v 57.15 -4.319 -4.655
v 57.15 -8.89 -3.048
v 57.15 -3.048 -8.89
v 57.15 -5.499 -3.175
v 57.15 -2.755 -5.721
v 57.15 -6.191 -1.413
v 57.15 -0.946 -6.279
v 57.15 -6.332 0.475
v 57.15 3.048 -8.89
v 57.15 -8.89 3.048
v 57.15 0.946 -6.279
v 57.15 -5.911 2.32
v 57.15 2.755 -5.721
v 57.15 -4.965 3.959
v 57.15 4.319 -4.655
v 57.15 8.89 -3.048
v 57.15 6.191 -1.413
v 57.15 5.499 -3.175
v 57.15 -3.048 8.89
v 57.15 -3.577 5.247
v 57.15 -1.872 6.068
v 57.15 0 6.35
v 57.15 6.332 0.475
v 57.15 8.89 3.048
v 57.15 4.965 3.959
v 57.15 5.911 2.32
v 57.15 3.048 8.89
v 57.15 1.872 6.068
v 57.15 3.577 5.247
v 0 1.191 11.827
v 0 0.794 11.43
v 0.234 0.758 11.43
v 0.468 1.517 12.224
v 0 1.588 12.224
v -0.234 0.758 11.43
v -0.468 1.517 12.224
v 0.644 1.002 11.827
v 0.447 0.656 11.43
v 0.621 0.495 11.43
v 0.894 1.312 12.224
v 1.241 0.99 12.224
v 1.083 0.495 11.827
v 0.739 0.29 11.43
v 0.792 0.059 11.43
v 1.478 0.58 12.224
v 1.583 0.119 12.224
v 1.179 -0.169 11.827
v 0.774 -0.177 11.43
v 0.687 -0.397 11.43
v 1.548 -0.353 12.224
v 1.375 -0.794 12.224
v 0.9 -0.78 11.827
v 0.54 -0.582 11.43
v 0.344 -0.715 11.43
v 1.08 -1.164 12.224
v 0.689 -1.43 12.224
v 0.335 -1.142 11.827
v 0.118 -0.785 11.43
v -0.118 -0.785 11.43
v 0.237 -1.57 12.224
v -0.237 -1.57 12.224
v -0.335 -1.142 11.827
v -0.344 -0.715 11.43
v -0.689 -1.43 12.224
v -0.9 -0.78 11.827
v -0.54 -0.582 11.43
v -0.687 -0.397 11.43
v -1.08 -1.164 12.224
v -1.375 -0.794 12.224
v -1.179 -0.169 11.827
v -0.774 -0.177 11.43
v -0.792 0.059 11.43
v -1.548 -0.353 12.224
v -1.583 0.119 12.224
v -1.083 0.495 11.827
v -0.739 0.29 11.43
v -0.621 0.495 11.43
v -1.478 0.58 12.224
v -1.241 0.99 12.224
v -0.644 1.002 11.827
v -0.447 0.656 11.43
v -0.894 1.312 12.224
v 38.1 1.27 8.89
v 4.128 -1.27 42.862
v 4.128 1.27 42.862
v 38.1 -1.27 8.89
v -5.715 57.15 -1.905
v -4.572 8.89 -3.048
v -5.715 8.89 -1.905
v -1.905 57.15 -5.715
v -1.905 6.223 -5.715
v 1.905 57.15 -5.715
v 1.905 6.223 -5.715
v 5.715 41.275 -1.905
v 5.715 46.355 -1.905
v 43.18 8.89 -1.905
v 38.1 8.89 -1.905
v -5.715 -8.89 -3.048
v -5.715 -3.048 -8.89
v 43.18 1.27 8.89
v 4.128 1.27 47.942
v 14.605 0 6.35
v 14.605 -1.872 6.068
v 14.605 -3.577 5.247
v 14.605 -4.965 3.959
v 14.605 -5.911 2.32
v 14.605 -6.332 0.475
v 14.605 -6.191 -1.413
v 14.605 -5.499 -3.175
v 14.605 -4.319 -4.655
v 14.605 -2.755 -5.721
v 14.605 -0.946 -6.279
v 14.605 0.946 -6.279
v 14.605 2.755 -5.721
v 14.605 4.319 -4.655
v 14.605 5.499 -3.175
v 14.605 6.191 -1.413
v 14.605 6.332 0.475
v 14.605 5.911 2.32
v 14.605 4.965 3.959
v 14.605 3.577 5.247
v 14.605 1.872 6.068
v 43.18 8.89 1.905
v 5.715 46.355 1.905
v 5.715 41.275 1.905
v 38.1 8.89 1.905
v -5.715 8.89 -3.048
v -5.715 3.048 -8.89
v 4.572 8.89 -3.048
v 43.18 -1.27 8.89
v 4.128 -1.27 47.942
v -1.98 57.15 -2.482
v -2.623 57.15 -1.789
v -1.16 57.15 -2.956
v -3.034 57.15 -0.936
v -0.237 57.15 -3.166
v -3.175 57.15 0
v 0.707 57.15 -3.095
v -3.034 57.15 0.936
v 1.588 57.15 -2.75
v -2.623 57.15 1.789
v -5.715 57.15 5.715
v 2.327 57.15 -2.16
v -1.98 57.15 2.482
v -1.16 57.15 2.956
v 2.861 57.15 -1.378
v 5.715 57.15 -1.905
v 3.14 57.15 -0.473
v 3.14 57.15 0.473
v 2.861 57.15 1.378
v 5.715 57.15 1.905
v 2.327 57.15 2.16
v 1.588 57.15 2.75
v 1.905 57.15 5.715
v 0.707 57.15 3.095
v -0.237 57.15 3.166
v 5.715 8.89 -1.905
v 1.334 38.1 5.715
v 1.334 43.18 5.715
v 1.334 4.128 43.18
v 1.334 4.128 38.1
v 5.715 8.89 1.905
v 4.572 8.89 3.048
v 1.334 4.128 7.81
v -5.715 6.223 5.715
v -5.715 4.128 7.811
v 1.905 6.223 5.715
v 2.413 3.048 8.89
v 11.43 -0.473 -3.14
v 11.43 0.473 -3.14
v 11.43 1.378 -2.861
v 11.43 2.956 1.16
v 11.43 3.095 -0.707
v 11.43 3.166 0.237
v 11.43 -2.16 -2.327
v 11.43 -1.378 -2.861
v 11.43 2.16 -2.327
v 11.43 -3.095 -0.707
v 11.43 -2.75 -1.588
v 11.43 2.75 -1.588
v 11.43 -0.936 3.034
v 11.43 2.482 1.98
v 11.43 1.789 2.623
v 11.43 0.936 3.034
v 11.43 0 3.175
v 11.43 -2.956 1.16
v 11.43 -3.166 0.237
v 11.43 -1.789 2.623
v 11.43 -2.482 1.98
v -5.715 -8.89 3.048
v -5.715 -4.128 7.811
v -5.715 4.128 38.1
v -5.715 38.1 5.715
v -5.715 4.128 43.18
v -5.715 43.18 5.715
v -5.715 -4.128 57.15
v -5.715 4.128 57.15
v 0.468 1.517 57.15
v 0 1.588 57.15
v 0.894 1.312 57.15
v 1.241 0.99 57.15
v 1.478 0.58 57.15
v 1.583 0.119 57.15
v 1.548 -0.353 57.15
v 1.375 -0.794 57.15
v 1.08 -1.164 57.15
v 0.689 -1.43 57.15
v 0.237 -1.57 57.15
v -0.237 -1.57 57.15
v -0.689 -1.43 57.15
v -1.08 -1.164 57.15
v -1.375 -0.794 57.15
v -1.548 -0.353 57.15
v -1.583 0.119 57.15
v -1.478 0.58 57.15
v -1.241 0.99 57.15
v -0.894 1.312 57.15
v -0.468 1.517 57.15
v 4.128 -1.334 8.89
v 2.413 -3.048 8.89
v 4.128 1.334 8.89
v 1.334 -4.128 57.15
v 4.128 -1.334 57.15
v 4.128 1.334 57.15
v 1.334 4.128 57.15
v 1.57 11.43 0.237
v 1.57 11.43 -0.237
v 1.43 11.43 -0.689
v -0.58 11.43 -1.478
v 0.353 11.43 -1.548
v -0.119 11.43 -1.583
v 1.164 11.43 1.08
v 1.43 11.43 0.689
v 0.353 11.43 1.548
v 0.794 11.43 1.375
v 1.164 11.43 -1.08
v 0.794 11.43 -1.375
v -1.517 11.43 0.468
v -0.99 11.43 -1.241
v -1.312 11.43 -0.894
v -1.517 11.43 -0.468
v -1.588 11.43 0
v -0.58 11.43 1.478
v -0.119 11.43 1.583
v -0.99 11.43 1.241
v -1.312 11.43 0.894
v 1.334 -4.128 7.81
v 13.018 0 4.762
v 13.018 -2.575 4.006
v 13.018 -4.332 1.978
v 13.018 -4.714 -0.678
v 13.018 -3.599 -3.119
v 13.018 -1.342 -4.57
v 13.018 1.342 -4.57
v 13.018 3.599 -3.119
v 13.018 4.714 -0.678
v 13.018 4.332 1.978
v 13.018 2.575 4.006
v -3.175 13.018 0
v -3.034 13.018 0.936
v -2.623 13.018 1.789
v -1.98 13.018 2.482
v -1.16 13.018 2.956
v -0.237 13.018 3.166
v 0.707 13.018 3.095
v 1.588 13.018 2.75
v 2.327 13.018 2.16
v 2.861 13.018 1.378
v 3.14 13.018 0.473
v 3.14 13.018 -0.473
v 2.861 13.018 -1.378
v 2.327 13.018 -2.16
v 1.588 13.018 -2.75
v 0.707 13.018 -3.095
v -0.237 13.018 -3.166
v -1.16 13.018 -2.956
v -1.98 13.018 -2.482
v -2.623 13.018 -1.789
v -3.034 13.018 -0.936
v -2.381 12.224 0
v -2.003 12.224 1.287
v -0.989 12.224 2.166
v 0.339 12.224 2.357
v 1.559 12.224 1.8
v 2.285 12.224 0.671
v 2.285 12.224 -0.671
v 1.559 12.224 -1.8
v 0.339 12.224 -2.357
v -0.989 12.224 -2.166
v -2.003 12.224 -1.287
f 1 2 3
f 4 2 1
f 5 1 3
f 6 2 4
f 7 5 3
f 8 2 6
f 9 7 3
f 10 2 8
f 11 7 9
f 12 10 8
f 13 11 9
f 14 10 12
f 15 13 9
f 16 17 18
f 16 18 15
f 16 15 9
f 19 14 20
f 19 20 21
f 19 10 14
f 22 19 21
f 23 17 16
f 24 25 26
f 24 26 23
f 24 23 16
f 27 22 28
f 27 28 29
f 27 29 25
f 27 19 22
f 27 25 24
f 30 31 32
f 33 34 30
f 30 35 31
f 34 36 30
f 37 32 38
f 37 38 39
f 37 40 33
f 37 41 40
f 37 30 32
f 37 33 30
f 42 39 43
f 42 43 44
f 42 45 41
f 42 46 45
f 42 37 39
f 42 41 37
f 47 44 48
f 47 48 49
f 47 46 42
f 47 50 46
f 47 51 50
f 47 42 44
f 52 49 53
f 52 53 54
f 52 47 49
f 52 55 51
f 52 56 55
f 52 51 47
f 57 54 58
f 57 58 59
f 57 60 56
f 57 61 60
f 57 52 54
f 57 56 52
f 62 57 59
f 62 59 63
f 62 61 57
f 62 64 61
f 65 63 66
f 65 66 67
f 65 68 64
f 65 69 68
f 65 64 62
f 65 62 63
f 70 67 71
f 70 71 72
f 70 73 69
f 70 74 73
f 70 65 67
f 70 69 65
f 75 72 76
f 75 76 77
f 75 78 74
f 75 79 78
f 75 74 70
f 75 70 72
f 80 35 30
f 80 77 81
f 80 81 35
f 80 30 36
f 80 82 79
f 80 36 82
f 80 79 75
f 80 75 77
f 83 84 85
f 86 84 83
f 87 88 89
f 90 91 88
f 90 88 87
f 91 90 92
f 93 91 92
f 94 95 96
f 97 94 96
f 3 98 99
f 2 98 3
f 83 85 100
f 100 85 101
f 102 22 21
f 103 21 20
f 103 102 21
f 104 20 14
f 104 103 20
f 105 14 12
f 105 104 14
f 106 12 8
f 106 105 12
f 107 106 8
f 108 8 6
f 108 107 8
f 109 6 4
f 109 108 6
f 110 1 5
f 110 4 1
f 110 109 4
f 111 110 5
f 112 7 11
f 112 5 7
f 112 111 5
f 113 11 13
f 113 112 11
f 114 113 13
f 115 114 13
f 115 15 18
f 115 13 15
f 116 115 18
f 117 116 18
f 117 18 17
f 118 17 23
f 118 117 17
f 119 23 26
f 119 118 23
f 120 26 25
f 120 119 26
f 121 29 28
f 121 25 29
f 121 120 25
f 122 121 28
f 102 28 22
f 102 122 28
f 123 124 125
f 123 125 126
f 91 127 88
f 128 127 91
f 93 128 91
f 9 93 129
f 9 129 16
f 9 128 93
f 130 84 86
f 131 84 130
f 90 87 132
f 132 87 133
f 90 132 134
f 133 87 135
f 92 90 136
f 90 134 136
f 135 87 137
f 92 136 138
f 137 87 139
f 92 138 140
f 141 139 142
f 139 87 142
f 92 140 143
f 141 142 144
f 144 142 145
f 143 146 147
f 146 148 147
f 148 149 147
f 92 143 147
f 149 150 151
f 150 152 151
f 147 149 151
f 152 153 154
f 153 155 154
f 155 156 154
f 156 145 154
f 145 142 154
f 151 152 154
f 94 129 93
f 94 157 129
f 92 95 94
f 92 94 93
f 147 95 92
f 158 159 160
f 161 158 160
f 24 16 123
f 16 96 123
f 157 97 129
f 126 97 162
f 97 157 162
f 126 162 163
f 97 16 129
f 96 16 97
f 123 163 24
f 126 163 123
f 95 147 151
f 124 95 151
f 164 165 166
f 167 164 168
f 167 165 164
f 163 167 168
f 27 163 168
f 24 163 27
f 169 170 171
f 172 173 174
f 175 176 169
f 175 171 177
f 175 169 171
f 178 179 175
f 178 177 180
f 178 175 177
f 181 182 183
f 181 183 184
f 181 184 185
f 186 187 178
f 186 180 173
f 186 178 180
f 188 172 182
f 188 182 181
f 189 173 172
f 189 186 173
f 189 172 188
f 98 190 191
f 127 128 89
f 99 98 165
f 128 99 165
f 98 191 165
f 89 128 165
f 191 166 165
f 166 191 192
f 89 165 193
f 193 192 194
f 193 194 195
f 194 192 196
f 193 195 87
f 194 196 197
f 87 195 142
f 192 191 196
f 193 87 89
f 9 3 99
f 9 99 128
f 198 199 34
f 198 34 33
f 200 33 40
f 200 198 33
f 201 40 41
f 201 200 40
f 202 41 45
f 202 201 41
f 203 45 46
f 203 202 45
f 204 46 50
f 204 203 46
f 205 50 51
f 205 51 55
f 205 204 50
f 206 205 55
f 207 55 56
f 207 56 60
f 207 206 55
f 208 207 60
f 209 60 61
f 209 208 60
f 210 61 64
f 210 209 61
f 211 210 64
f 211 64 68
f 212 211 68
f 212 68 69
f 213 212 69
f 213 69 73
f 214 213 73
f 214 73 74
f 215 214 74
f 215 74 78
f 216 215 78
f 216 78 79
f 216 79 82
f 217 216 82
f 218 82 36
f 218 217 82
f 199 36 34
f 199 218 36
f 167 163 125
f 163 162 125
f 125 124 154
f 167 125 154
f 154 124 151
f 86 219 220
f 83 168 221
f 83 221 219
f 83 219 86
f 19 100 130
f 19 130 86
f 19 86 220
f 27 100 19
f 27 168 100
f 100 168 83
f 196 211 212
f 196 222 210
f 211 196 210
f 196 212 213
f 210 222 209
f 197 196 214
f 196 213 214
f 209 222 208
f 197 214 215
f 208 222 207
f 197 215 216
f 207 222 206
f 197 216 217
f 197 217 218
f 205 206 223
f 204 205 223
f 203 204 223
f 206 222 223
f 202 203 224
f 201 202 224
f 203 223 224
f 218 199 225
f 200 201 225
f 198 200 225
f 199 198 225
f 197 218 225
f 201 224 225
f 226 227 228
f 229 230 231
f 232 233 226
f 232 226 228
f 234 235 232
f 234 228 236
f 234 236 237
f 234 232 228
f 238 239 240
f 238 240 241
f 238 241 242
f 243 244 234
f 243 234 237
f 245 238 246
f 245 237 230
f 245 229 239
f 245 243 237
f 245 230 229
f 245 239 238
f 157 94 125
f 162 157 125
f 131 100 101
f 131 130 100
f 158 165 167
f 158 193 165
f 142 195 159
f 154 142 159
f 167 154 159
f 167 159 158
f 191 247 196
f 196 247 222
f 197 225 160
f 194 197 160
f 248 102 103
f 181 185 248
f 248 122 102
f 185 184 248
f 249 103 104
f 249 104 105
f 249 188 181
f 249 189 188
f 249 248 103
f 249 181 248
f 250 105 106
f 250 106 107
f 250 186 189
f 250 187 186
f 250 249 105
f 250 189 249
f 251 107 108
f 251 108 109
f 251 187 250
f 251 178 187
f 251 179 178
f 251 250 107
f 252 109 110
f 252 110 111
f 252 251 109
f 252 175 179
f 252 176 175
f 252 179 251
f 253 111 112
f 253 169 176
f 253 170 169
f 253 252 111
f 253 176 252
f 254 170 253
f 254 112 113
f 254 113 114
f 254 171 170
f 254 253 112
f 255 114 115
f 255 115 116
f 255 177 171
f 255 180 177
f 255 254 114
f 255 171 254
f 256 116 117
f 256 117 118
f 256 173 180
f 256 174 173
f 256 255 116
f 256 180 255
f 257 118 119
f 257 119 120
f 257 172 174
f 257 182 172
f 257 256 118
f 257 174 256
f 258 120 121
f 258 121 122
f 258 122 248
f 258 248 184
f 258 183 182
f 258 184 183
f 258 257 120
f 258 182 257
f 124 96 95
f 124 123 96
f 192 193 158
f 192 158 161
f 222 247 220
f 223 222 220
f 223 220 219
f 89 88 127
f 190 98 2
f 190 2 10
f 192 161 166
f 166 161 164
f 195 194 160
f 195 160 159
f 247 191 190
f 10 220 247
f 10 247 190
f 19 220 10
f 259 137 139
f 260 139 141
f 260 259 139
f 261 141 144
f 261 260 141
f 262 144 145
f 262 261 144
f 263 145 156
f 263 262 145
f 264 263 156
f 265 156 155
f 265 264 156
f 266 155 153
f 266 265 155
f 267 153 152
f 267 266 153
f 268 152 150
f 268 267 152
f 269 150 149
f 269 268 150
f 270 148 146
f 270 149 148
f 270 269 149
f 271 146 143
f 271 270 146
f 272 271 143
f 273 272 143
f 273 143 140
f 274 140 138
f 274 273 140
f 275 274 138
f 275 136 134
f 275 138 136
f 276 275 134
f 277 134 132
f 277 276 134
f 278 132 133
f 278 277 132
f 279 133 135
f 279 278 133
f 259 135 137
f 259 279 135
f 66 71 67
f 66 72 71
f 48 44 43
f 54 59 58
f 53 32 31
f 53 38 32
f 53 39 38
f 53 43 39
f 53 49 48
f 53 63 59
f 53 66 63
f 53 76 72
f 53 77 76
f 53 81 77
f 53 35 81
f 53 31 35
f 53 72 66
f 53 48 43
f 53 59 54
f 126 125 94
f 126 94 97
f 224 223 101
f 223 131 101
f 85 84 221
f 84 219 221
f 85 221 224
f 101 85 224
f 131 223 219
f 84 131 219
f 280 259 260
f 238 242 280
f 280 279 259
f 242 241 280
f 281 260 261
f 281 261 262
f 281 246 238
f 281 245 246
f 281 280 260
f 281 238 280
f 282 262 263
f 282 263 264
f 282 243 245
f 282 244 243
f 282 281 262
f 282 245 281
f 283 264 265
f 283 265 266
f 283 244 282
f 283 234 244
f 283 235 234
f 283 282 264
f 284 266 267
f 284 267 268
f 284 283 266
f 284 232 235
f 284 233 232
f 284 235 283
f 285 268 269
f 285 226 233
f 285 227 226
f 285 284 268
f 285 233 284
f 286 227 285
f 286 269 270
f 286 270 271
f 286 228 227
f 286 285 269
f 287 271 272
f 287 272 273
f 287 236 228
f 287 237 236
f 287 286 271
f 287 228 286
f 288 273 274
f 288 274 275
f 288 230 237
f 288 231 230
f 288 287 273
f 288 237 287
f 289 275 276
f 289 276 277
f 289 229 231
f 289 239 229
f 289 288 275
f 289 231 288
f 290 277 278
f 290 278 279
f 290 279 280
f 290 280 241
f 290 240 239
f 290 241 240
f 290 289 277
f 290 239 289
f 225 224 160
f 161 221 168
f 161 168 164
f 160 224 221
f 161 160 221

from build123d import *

# Parameters (mm, degrees)
F1_W          = 17.78
F1_H          = 17.78
F2_DEPTH      = 57.15
F4_SIZE       = 5.842
F6_W          = 8.255
F6_H          = 8.255
F7_DEPTH      = 57.15
F8_DEPTH      = 8.89
F10_T4_DEPTH  = 63.7100645368
F10_T9_DEPTH  = 63.7100645368
F10_T14_DEPTH = 15.4500645368
F10_T19_DEPTH = 63.7100645368
F10_T24_DEPTH = 63.7100645368
F10_T29_DEPTH = 15.4500645368
F12_W         = 11.43
F12_H         = 11.43
F13_DEPTH     = 57.15
F15_SIZE      = 3.81
F17_DEPTH     = 1.27
F19_DEPTH     = 1.905
F20_DEPTH     = 5.715
F21_T1_DEPTH  = 35.7625440314
F21_T6_DEPTH  = 35.7625440314
F21_T12_DEPTH = 35.7625440314
F21_T17_DEPTH = 35.7625440314
F21_T22_DEPTH = 35.7625440314
F22_DEPTH     = 1.5875
F25_DEPTH     = 7.0485


# Not quite as in the source:
# - a fillet or chamfer that OpenCascade refuses, or shapes differently, is made with other operations: its cross-section is extruded or revolved along the edge and cut away or added
# - an extrude ends at something that could not be found from the text; its depth is read off the source's solid


with BuildPart() as f2:
    # F1 (on Right) → F2 (new body)
    with BuildSketch(Plane.YZ):
        Rectangle(F1_W, F1_H)
    extrude(amount=F2_DEPTH)

    # F0 (on Front) → F3 (revolve, cut)
    with BuildSketch(Plane.XZ):
        Polygon((11.43, 3.175), (11.43, 0), (62.23, 0), (62.23, 6.35), (14.605, 6.35), align=None)
    revolve(axis=Axis((36.83, 0, 0), (1, 0, 0)), mode=Mode.SUBTRACT)

    # F4
    f4_edges = [f2.edges().sort_by_distance(p)[0] for p in [
        (28.575, -8.89, -8.89),
        (28.575, 8.89, 8.89),
        (28.575, -8.89, 8.89),
        (28.575, 8.89, -8.89),
    ]]
    chamfer(f4_edges, length=F4_SIZE)

    # F6 (on Top) → F7 (join)
    with BuildSketch(Plane.XY):
        Rectangle(F6_W, F6_H)
    extrude(amount=F7_DEPTH)

    # F8 (add, through all): a face of the model
    f8_faces = [f2.faces().sort_by_distance(p)[0] for p in [
        (-2.06375, 0, 0),
    ]]
    extrude(f8_faces, amount=F8_DEPTH)

    # F5 (on Right) → F9 (revolve, cut)
    with BuildSketch(Plane.YZ):
        Polygon((0, 66.04), (0, 11.43), (0.79375, 11.43), (1.5875, 12.22375), (1.5875, 66.04), align=None)
    revolve(axis=Axis((0, 0, 38.735), (0, 0, -1)), mode=Mode.SUBTRACT)

    # F10: chamfer of 2.794 on 4 edges, made by hand


with BuildPart() as f10_tool2:
    # F10_s3 → F10_t4 (new body)
    with BuildSketch(Plane.XY.offset(0.6252177316)):
        Polygon((4.1275, 1.3335), (1.3335, 4.1275), (4.1275, 4.1275), align=None)
    extrude(amount=F10_T4_DEPTH)

    split(bisect_by=Plane(origin=(0, 5.969, 5.969), x_dir=(1, 0, 0), z_dir=(0, 0.7071067812, 0.7071067812)), keep=Keep.TOP)


with BuildPart() as f2_1:
    add(f2.part)

    # F10_t1: cut F10_tool2
    add(f10_tool2.part, mode=Mode.SUBTRACT)


with BuildPart() as f10_tool7:
    # F10_s8 → F10_t9 (new body)
    with BuildSketch(Plane.XY.offset(0.6252177316)):
        Polygon((4.1275, 1.3335), (1.3335, 4.1275), (4.1275, 4.1275), align=None)
    extrude(amount=F10_T9_DEPTH)

    split(bisect_by=Plane.XY.offset(8.89), keep=Keep.TOP)


with BuildPart() as f2_2:
    add(f2_1.part)

    # F10_t6: cut F10_tool7
    add(f10_tool7.part, mode=Mode.SUBTRACT)


with BuildPart() as f10_tool12:
    # F10_s13 → F10_t14 (new body)
    with BuildSketch(Plane.XY.offset(-0.6252177316)):
        Polygon((-2.794, 4.1275), (0, 1.3335), (0, 4.1275), align=None)
    extrude(amount=-F10_T14_DEPTH)

    split(bisect_by=Plane(origin=(0, 5.969, -5.969), x_dir=(1, 0, 0), z_dir=(0, 0.7071067812, -0.7071067812)), keep=Keep.TOP)


with BuildPart() as f2_3:
    add(f2_2.part)

    # F10_t11: cut F10_tool12
    add(f10_tool12.part, mode=Mode.SUBTRACT)


with BuildPart() as f10_tool17:
    # F10_s18 → F10_t19 (new body)
    with BuildSketch(Plane.XY.offset(0.6252177316)):
        Polygon((1.3335, -4.1275), (4.1275, -1.3335), (4.1275, -4.1275), align=None)
    extrude(amount=F10_T19_DEPTH)

    split(bisect_by=Plane.XY.offset(8.89), keep=Keep.TOP)


with BuildPart() as f2_4:
    add(f2_3.part)

    # F10_t16: cut F10_tool17
    add(f10_tool17.part, mode=Mode.SUBTRACT)


with BuildPart() as f10_tool22:
    # F10_s23 → F10_t24 (new body)
    with BuildSketch(Plane.XY.offset(0.6252177316)):
        Polygon((1.3335, -4.1275), (4.1275, -1.3335), (4.1275, -4.1275), align=None)
    extrude(amount=F10_T24_DEPTH)

    split(bisect_by=Plane(origin=(0, -5.969, 5.969), x_dir=(1, 0, 0), z_dir=(0, -0.7071067812, 0.7071067812)), keep=Keep.TOP)


with BuildPart() as f2_5:
    add(f2_4.part)

    # F10_t21: cut F10_tool22
    add(f10_tool22.part, mode=Mode.SUBTRACT)


with BuildPart() as f10_tool27:
    # F10_s28 → F10_t29 (new body)
    with BuildSketch(Plane.XY.offset(-0.6252177316)):
        Polygon((-2.794, -4.1275), (0, -1.3335), (0, -4.1275), align=None)
    extrude(amount=-F10_T29_DEPTH)

    split(bisect_by=Plane(origin=(0, -5.969, -5.969), x_dir=(1, 0, 0), z_dir=(0, -0.7071067812, -0.7071067812)), keep=Keep.TOP)


with BuildPart() as f2_6:
    add(f2_5.part)

    # F10_t26: cut F10_tool27
    add(f10_tool27.part, mode=Mode.SUBTRACT)

    # F12 (on Front) → F13 (join)
    with BuildSketch(Plane.XZ):
        Rectangle(F12_W, F12_H)
    extrude(amount=-F13_DEPTH)

    # F11 (on Top) → F14 (revolve, cut)
    with BuildSketch(Plane.XY):
        Polygon((0, 66.04), (-3.175, 66.04), (-3.175, 13.0175), (-1.5875, 11.43), (0, 11.43), align=None)
    revolve(axis=Axis((0, 24.5966146997, 0), (0, 1, 0)), mode=Mode.SUBTRACT)

    # F15
    f15_edges = [f2_6.edges().sort_by_distance(p)[0] for p in [
        (5.715, 31.6865, 5.715),
        (5.715, 31.6865, -5.715),
        (-5.715, 28.575, -5.715),
    ]]
    chamfer(f15_edges, length=F15_SIZE)

    # F16 (on Front) → F17 (join, symmetric)
    with BuildSketch(Plane.XZ):
        Polygon((43.18, 8.89), (4.1275, 47.9425), (4.1275, 42.8625), (38.1, 8.89), align=None)
    extrude(amount=F17_DEPTH, both=True)

    # F18 (on Top) → F19 (join, symmetric)
    with BuildSketch(Plane.XY):
        Polygon((43.18, 8.89), (5.715, 46.355), (5.715, 41.275), (38.1, 8.89), align=None)
    extrude(amount=F19_DEPTH, both=True)

    # F1 (on Right) → F20 (join, through all)
    with BuildSketch(Plane.YZ):
        Rectangle(F1_W, F1_H)
    extrude(amount=-F20_DEPTH)

    # F21: chamfer of 5.842 on 4 edges, made by hand

    # F21_s2 → F21_t1 (cut)
    with BuildSketch(Plane.YZ.offset(-20.7387720157)):
        Polygon((-3.048, -8.89), (-8.89, -3.048), (-8.89, -8.89), align=None)
    extrude(amount=F21_T1_DEPTH, mode=Mode.SUBTRACT)


with BuildPart() as f21_tool4:
    # F21_s5 → F21_t6 (new body)
    with BuildSketch(Plane.YZ.offset(15.0237720157)):
        Polygon((3.048, 8.89), (8.89, 3.048), (8.89, 8.89), align=None)
    extrude(amount=-F21_T6_DEPTH)

    split(bisect_by=Plane.XZ.offset(-4.1275), keep=Keep.BOTTOM)

    split(bisect_by=Plane.XY.offset(5.715), keep=Keep.TOP)


with BuildPart() as f2_7:
    add(f2_6.part)

    # F21_t3: cut F21_tool4
    add(f21_tool4.part, mode=Mode.SUBTRACT)


with BuildPart() as f21_tool10:
    # F21_s11 → F21_t12 (new body)
    with BuildSketch(Plane.YZ.offset(15.0237720157)):
        Polygon((-3.048, 8.89), (-8.89, 3.048), (-8.89, 8.89), align=None)
    extrude(amount=-F21_T12_DEPTH)

    split(bisect_by=Plane.XZ.offset(4.1275), keep=Keep.TOP)


with BuildPart() as f2_8:
    add(f2_7.part)

    # F21_t9: cut F21_tool10
    add(f21_tool10.part, mode=Mode.SUBTRACT)


with BuildPart() as f21_tool15:
    # F21_s16 → F21_t17 (new body)
    with BuildSketch(Plane.YZ.offset(15.0237720157)):
        Polygon((3.048, -8.89), (8.89, -3.048), (8.89, -8.89), align=None)
    extrude(amount=-F21_T17_DEPTH)

    split(bisect_by=Plane.XY.offset(-5.715), keep=Keep.BOTTOM)


with BuildPart() as f2_9:
    add(f2_8.part)

    # F21_t14: cut F21_tool15
    add(f21_tool15.part, mode=Mode.SUBTRACT)


with BuildPart() as f21_tool20:
    # F21_s21 → F21_t22 (new body)
    with BuildSketch(Plane.YZ.offset(15.0237720157)):
        Polygon((3.048, -8.89), (8.89, -3.048), (8.89, -8.89), align=None)
    extrude(amount=-F21_T22_DEPTH)

    split(bisect_by=Plane(origin=(-3.81, 0, -3.81), x_dir=(0, 1, 0), z_dir=(-0.7071067812, 0, -0.7071067812)), keep=Keep.TOP)


with BuildPart() as f2_10:
    add(f2_9.part)

    # F21_t19: cut F21_tool20
    add(f21_tool20.part, mode=Mode.SUBTRACT)

    # F22 (add, through all): a face of the model
    f22_faces = [f2_10.faces().sort_by_distance(p)[0] for p in [
        (-4.1275, 0, 33.02),
    ]]
    extrude(f22_faces, amount=F22_DEPTH)

    # F24 (on offset) → F25 (join, through all)
    with BuildSketch(Plane(origin=(-5.715, 0, 0), x_dir=(0, -1, 0), z_dir=(-1, 0, 0))):
        Polygon((-43.18, 5.715), (-38.1, 5.715), (-4.1275, 38.1), (-4.1275, 43.18), align=None)
    extrude(amount=-F25_DEPTH)


solid = f2_10.part
